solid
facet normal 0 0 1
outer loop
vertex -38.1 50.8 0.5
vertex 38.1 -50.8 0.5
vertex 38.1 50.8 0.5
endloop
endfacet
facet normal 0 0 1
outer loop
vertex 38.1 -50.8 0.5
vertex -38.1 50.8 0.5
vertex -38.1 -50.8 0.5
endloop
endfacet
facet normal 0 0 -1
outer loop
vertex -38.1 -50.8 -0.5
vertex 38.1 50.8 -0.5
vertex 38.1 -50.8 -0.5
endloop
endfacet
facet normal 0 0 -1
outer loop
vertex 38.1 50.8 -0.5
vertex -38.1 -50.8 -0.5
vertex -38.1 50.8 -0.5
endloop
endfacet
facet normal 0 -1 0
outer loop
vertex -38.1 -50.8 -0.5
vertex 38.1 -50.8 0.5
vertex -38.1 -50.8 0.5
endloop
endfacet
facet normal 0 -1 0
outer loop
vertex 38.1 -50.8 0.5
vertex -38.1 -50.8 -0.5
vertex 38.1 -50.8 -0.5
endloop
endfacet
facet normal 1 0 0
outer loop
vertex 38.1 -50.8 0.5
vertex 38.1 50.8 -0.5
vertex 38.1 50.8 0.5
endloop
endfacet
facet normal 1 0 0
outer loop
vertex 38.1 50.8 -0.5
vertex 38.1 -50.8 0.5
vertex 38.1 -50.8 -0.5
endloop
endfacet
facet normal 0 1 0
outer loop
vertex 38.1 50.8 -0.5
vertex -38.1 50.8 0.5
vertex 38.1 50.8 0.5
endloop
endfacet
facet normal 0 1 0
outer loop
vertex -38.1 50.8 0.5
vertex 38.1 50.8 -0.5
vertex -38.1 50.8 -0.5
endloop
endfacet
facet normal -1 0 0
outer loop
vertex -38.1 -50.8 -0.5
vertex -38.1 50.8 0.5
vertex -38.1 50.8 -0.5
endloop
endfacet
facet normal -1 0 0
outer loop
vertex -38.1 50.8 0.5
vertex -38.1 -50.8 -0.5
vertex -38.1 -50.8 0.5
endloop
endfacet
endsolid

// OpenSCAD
//Plate for maintaining orthogonality when measuring material sheets
length = 76.2;
width = 101.6;
height = 1;
cube([length,width,height], true);
